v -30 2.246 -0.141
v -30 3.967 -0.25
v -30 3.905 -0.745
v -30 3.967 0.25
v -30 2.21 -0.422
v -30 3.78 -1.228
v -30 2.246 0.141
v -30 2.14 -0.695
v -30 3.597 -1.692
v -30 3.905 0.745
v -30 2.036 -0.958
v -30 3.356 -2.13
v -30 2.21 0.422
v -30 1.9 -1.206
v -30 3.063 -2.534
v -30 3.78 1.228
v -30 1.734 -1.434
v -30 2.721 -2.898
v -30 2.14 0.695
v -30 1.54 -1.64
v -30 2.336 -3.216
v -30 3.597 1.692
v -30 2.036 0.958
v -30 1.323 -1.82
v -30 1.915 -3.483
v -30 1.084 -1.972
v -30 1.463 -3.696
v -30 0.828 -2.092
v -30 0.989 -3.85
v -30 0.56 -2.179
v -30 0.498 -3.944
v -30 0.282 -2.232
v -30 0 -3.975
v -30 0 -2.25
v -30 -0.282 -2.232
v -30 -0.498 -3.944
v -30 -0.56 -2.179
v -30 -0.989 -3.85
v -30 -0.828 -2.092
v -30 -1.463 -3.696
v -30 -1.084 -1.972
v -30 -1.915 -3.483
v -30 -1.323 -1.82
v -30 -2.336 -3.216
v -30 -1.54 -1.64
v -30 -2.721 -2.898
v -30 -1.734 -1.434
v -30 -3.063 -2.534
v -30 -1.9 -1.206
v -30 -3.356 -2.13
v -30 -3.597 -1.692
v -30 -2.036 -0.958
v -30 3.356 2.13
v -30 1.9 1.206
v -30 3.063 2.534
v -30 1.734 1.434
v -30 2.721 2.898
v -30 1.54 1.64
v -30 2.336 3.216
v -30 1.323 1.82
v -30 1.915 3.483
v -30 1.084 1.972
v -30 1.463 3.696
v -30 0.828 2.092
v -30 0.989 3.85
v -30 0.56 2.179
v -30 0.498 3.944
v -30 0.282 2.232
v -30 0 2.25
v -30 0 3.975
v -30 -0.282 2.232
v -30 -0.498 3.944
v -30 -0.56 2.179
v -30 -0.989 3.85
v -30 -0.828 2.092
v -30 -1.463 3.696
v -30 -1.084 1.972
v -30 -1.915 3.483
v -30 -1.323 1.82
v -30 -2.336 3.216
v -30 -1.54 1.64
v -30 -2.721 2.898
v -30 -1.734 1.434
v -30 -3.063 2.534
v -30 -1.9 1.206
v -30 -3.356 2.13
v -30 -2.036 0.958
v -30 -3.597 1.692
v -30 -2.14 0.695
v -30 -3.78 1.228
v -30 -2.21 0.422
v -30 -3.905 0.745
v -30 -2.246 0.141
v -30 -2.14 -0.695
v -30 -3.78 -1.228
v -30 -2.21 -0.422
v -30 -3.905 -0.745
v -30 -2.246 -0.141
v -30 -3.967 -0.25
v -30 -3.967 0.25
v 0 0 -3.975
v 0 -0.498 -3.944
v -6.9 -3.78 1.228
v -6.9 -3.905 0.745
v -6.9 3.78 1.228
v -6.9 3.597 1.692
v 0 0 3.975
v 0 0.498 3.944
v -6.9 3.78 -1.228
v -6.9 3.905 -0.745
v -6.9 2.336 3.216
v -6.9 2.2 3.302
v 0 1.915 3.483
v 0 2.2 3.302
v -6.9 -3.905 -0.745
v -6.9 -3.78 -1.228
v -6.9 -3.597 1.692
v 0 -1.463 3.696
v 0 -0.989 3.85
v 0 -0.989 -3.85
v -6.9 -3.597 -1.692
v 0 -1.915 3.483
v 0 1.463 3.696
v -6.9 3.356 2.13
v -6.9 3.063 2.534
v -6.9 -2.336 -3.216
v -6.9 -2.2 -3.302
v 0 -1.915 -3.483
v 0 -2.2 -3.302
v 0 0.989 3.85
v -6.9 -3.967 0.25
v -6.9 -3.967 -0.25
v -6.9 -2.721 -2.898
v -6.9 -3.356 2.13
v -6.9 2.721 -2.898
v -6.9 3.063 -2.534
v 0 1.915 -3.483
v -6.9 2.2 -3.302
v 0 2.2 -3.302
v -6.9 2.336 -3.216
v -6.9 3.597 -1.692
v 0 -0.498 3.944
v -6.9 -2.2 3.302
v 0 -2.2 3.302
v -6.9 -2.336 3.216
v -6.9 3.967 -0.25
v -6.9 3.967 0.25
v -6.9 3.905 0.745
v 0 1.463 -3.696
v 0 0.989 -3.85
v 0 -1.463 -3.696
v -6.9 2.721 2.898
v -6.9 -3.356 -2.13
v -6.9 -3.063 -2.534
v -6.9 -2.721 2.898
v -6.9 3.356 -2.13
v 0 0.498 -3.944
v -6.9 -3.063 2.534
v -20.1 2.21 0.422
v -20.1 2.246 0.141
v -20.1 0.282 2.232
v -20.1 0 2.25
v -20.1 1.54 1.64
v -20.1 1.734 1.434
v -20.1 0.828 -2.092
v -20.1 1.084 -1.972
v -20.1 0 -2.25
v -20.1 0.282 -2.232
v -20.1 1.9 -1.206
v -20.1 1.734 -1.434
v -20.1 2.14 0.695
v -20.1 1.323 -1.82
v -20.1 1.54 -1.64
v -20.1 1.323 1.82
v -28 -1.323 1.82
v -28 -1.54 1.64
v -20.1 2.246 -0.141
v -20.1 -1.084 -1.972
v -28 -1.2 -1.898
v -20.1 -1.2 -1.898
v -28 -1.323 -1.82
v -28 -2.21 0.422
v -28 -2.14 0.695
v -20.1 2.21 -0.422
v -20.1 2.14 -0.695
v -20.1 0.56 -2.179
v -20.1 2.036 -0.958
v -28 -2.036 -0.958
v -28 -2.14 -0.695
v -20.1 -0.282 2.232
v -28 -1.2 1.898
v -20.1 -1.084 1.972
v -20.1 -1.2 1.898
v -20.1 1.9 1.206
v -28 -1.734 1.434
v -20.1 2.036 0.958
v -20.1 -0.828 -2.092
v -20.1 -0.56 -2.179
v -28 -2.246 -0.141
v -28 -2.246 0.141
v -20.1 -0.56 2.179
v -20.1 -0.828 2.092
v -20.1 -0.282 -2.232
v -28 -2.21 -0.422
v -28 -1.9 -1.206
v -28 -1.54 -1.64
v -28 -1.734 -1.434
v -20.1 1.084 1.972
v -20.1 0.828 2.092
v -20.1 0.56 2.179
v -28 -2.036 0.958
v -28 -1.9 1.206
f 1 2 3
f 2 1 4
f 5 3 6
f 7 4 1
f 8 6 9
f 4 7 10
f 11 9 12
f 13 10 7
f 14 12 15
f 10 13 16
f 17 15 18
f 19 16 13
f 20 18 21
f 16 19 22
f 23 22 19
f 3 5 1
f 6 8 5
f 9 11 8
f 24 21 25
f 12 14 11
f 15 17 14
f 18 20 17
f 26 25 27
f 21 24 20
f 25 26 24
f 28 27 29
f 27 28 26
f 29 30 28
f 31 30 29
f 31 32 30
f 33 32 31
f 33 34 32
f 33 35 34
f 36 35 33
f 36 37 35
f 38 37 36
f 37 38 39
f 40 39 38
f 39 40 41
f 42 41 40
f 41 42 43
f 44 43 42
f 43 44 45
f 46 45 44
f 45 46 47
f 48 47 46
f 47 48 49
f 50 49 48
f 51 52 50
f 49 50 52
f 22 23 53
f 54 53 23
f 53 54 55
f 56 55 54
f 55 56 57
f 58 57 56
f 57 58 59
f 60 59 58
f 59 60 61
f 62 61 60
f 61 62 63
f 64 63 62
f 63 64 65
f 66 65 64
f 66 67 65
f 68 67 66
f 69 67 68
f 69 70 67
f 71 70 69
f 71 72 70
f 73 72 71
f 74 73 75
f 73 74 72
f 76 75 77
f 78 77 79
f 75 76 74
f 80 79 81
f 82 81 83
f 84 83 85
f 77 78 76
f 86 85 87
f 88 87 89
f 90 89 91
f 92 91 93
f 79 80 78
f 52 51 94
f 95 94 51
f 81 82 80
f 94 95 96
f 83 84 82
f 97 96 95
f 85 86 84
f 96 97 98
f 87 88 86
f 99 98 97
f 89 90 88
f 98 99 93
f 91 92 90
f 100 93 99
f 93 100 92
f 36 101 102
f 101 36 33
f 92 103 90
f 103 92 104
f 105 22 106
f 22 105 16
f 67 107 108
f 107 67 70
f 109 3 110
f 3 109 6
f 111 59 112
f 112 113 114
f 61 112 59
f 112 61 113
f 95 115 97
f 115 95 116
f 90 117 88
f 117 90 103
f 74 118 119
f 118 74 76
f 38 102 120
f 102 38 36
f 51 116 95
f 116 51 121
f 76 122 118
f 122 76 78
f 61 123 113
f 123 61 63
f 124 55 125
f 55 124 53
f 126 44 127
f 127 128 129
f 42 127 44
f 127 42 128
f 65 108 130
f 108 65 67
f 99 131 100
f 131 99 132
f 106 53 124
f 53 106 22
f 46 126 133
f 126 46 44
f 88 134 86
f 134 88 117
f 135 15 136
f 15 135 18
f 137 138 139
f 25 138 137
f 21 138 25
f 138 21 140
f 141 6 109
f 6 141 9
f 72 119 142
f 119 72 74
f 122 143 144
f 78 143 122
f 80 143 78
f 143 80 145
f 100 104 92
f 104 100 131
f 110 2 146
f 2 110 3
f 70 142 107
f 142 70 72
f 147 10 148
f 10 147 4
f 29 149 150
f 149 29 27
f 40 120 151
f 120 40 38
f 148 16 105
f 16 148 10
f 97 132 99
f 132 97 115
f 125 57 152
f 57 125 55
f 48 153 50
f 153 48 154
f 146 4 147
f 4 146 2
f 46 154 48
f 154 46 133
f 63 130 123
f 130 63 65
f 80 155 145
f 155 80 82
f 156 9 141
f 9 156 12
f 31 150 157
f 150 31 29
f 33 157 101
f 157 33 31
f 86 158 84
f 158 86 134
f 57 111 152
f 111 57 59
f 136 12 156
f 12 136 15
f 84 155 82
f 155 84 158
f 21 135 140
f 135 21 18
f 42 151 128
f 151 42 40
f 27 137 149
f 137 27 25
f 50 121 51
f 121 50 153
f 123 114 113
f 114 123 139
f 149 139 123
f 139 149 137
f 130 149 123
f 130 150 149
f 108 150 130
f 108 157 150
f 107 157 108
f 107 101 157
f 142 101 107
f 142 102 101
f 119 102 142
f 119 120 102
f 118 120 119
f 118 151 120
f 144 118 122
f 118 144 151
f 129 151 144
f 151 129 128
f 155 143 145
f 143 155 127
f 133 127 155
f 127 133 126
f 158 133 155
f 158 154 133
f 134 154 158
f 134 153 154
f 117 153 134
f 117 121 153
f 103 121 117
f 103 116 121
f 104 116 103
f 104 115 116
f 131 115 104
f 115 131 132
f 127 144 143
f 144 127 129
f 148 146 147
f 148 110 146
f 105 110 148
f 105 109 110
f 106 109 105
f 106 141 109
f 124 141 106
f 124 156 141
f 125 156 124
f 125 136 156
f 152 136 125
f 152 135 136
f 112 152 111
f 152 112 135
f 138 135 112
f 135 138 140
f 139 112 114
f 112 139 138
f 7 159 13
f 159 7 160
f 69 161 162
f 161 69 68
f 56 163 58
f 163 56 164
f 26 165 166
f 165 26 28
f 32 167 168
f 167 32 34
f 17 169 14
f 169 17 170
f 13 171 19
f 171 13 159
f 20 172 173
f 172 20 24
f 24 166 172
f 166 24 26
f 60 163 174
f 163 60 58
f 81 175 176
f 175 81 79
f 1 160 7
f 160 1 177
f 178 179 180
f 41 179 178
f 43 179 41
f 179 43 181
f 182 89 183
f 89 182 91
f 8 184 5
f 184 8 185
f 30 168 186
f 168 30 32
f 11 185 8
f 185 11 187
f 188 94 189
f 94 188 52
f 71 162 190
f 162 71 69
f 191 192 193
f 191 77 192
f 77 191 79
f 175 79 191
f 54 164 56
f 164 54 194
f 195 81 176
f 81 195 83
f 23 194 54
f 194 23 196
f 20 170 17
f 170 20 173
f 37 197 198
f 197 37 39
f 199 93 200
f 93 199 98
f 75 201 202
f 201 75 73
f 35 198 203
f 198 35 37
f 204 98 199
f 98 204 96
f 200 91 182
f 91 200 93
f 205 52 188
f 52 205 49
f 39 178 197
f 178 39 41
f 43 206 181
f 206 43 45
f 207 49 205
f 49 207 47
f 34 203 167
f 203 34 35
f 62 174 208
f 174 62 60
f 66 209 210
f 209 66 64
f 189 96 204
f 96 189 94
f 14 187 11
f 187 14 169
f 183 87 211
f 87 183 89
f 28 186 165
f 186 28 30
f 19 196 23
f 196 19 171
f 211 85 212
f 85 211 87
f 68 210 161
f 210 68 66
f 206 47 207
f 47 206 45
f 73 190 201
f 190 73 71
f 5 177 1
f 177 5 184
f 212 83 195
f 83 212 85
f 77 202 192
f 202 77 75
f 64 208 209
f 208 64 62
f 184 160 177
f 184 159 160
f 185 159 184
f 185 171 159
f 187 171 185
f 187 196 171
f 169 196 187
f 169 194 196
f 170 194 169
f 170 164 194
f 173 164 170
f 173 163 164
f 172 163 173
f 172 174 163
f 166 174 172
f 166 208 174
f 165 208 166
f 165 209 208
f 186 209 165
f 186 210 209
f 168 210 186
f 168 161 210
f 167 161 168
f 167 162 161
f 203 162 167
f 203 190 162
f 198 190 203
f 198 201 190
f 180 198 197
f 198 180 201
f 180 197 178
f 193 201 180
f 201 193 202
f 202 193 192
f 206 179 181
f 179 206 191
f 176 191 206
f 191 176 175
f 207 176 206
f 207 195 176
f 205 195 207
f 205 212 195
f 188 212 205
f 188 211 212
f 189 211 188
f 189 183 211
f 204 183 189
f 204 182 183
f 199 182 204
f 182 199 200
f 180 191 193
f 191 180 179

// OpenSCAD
// file: ../robot_settings.scad
main_box_x = 95; // 96
main_box_y = 102;
main_box_z = 74; // 74.5
wall_thickness = 2;

rail_gap = 2;
rail_inset = 7;

rail_thickness = 7;
rail_length = 250;
rail_width = 200;

raspberry_pi_screw_seperation_y = 57;
raspberry_pi_screw_seperation_z = 48;
raspberry_pi_peg_h = 8;

gears_module = 1;
pinion_gear_teeth = 30;
pinion_gear_width = 5;
pinion_gear_bore = 4;

gears_setback_distance = 25;
gear_post_height = 2 * pinion_gear_width + rail_thickness + 8 ;

steering_motor_mount_x = 45;
steering_motor_mount_y = 36;
steering_motor_mount_z = 18;
steering_motor_mount_setback_distance = gears_setback_distance + 16;

dc_motor_housing_minus_encoder_z = 48;
dc_motor_encoder_z = 9.33;
dc_motor_encoder_wheel_d = 13.4;
dc_motor_encoder_wheel_thickness = 5;
dc_motor_encoder_wheel_gap = 3;
dc_motor_encoder_circuit_thickness = 2;
dc_motor_cutout_d = 24.8;
dc_motor_cutout_z = 19.5;

dc_motor_screw_head_z = 2;
dc_motor_screw_head_d = 5.6;
dc_motor_screw_d = 3.2;
dc_motor_screw_offset = 8.5;

dc_motor_axle_ring_z = 3;
dc_motor_axle_ring_d = 7.2;
dc_motor_axle_cutout_d = 4.5;
dc_motor_axle_cutout_z = 10;
dc_motor_axle_notch_cutout = 0.4;
dc_motor_axle_notch_cutout_z = 6;

drv8871_x = 20.3;
drv8871_y = 24;
drv8871_z = 2;
drv8871_screw_d = 2.5;
drv8871_screw_distance = 15.64;
drv8871_solder_points_z = 2;
drv8871_solder_points_d = 1.66;
drv8871_solder_offset_y = 4.4;
drv8871_solder_inner_points_distance = 5;
drv8871_solder_outer_points_distance = 12;

drv8871mount_edge_x = 1.5;
drv8871mount_edge_wall = 3;
drv8871mount_z = 5;
drv8871mount_x = drv8871_x +  drv8871mount_edge_wall - 2* drv8871mount_edge_x;
drv8871mount_y = 19;

pdmount_x = 20;
pdmount_y = 30;
pdmount_z = 2;
pdmount_edge_x = 1.5;
pdmount_edge_wall = 3;

steering_shaft_z = gear_post_height + dc_motor_axle_ring_z + pinion_gear_width + 15;
steering_shaft_d = 7;
steering_shaft_motor_fitting_d = 9;

lidar_mount_y = 110;
lidar_mount_x = 65 + 20;
lidar_narrow_screws = 40;
lidar_wide_screws = 56;
lidar_front_to_back_screws = 70;
lidar_screw_d = 3;

ball_bearing_height = 7;
ball_bearing_outer_diameter = 22;
ball_bearing_inner_diameter = 8;

pull_bar_radius = 3.3;

rack_module = 1;
rack_length = main_box_x / 2;
rack_height = 10;
rack_width = 10;
rack_teeth = 30;
rack_bore = 3;

// tire hardware
axle_length = 30;
axle_reciever_inner_diameter = 7.75;
axle_reciever_length = 18.8;
axle_notch_length = 7;
axle_notch_cutout = 2.4;

// power distribution bar
power_bar_cutout_x = 96;
power_bar_y = 19.1;
power_bar_z = 1.5;
power_bar_screw_distance = 91.4;
power_bar_screw_d = 2.8;
power_bar_standoff_z = 5;
power_bar_standoff_d = 6.83;
// main file
include <../robot_settings.scad>

$fn=50;

module axle(
  axle_length = axle_length,
  axle_inner_radius = axle_reciever_inner_diameter / 2 + 0.1,
  rotate = true,
  rear_axle = true
)
{
  cutout1 = -axle_notch_cutout;
  cutout2 = axle_notch_cutout;
  
   rotation = rotate ? 180 : 0;
      
  rotate([0,rotation,0])
  {
    
    // inner axle
    difference() {
        // axle
       rotate([0,90,0])
       cylinder(axle_length, r = axle_inner_radius);
      
      // axle notch
       translate([-.1, cutout1 -axle_inner_radius + .2, -axle_inner_radius])
       cube([axle_notch_length, axle_inner_radius, 2 * axle_inner_radius]);
      
       translate([ -.1, cutout2 - .2, -axle_inner_radius])
       cube([axle_notch_length,  axle_inner_radius, 2 * axle_inner_radius]);    
      
        translate([axle_length + .1, 0, 0])
   
        if (rear_axle) {
          // carve out the engine axle insert
          rotate([0, -90, 0])
            cylinder(h = dc_motor_axle_cutout_z, d = dc_motor_axle_cutout_d);          
        }
      }

      // 
      if (!rear_axle) {
        
          // axle cap
          translate([axle_length, 0, 0])
           rotate([0,90,0])
          cylinder(h = 3, d = ball_bearing_outer_diameter);
      }
      else {
        
        // engine axle notch
        translate([
            axle_length - 7, 
            -dc_motor_axle_notch_cutout - 1.5,
            0
          ])
          cube([
            dc_motor_axle_cutout_z, 
            dc_motor_axle_notch_cutout + 1, 
            dc_motor_axle_notch_cutout_z -.7], center = true); 
      }
  }
}
 
axle();
